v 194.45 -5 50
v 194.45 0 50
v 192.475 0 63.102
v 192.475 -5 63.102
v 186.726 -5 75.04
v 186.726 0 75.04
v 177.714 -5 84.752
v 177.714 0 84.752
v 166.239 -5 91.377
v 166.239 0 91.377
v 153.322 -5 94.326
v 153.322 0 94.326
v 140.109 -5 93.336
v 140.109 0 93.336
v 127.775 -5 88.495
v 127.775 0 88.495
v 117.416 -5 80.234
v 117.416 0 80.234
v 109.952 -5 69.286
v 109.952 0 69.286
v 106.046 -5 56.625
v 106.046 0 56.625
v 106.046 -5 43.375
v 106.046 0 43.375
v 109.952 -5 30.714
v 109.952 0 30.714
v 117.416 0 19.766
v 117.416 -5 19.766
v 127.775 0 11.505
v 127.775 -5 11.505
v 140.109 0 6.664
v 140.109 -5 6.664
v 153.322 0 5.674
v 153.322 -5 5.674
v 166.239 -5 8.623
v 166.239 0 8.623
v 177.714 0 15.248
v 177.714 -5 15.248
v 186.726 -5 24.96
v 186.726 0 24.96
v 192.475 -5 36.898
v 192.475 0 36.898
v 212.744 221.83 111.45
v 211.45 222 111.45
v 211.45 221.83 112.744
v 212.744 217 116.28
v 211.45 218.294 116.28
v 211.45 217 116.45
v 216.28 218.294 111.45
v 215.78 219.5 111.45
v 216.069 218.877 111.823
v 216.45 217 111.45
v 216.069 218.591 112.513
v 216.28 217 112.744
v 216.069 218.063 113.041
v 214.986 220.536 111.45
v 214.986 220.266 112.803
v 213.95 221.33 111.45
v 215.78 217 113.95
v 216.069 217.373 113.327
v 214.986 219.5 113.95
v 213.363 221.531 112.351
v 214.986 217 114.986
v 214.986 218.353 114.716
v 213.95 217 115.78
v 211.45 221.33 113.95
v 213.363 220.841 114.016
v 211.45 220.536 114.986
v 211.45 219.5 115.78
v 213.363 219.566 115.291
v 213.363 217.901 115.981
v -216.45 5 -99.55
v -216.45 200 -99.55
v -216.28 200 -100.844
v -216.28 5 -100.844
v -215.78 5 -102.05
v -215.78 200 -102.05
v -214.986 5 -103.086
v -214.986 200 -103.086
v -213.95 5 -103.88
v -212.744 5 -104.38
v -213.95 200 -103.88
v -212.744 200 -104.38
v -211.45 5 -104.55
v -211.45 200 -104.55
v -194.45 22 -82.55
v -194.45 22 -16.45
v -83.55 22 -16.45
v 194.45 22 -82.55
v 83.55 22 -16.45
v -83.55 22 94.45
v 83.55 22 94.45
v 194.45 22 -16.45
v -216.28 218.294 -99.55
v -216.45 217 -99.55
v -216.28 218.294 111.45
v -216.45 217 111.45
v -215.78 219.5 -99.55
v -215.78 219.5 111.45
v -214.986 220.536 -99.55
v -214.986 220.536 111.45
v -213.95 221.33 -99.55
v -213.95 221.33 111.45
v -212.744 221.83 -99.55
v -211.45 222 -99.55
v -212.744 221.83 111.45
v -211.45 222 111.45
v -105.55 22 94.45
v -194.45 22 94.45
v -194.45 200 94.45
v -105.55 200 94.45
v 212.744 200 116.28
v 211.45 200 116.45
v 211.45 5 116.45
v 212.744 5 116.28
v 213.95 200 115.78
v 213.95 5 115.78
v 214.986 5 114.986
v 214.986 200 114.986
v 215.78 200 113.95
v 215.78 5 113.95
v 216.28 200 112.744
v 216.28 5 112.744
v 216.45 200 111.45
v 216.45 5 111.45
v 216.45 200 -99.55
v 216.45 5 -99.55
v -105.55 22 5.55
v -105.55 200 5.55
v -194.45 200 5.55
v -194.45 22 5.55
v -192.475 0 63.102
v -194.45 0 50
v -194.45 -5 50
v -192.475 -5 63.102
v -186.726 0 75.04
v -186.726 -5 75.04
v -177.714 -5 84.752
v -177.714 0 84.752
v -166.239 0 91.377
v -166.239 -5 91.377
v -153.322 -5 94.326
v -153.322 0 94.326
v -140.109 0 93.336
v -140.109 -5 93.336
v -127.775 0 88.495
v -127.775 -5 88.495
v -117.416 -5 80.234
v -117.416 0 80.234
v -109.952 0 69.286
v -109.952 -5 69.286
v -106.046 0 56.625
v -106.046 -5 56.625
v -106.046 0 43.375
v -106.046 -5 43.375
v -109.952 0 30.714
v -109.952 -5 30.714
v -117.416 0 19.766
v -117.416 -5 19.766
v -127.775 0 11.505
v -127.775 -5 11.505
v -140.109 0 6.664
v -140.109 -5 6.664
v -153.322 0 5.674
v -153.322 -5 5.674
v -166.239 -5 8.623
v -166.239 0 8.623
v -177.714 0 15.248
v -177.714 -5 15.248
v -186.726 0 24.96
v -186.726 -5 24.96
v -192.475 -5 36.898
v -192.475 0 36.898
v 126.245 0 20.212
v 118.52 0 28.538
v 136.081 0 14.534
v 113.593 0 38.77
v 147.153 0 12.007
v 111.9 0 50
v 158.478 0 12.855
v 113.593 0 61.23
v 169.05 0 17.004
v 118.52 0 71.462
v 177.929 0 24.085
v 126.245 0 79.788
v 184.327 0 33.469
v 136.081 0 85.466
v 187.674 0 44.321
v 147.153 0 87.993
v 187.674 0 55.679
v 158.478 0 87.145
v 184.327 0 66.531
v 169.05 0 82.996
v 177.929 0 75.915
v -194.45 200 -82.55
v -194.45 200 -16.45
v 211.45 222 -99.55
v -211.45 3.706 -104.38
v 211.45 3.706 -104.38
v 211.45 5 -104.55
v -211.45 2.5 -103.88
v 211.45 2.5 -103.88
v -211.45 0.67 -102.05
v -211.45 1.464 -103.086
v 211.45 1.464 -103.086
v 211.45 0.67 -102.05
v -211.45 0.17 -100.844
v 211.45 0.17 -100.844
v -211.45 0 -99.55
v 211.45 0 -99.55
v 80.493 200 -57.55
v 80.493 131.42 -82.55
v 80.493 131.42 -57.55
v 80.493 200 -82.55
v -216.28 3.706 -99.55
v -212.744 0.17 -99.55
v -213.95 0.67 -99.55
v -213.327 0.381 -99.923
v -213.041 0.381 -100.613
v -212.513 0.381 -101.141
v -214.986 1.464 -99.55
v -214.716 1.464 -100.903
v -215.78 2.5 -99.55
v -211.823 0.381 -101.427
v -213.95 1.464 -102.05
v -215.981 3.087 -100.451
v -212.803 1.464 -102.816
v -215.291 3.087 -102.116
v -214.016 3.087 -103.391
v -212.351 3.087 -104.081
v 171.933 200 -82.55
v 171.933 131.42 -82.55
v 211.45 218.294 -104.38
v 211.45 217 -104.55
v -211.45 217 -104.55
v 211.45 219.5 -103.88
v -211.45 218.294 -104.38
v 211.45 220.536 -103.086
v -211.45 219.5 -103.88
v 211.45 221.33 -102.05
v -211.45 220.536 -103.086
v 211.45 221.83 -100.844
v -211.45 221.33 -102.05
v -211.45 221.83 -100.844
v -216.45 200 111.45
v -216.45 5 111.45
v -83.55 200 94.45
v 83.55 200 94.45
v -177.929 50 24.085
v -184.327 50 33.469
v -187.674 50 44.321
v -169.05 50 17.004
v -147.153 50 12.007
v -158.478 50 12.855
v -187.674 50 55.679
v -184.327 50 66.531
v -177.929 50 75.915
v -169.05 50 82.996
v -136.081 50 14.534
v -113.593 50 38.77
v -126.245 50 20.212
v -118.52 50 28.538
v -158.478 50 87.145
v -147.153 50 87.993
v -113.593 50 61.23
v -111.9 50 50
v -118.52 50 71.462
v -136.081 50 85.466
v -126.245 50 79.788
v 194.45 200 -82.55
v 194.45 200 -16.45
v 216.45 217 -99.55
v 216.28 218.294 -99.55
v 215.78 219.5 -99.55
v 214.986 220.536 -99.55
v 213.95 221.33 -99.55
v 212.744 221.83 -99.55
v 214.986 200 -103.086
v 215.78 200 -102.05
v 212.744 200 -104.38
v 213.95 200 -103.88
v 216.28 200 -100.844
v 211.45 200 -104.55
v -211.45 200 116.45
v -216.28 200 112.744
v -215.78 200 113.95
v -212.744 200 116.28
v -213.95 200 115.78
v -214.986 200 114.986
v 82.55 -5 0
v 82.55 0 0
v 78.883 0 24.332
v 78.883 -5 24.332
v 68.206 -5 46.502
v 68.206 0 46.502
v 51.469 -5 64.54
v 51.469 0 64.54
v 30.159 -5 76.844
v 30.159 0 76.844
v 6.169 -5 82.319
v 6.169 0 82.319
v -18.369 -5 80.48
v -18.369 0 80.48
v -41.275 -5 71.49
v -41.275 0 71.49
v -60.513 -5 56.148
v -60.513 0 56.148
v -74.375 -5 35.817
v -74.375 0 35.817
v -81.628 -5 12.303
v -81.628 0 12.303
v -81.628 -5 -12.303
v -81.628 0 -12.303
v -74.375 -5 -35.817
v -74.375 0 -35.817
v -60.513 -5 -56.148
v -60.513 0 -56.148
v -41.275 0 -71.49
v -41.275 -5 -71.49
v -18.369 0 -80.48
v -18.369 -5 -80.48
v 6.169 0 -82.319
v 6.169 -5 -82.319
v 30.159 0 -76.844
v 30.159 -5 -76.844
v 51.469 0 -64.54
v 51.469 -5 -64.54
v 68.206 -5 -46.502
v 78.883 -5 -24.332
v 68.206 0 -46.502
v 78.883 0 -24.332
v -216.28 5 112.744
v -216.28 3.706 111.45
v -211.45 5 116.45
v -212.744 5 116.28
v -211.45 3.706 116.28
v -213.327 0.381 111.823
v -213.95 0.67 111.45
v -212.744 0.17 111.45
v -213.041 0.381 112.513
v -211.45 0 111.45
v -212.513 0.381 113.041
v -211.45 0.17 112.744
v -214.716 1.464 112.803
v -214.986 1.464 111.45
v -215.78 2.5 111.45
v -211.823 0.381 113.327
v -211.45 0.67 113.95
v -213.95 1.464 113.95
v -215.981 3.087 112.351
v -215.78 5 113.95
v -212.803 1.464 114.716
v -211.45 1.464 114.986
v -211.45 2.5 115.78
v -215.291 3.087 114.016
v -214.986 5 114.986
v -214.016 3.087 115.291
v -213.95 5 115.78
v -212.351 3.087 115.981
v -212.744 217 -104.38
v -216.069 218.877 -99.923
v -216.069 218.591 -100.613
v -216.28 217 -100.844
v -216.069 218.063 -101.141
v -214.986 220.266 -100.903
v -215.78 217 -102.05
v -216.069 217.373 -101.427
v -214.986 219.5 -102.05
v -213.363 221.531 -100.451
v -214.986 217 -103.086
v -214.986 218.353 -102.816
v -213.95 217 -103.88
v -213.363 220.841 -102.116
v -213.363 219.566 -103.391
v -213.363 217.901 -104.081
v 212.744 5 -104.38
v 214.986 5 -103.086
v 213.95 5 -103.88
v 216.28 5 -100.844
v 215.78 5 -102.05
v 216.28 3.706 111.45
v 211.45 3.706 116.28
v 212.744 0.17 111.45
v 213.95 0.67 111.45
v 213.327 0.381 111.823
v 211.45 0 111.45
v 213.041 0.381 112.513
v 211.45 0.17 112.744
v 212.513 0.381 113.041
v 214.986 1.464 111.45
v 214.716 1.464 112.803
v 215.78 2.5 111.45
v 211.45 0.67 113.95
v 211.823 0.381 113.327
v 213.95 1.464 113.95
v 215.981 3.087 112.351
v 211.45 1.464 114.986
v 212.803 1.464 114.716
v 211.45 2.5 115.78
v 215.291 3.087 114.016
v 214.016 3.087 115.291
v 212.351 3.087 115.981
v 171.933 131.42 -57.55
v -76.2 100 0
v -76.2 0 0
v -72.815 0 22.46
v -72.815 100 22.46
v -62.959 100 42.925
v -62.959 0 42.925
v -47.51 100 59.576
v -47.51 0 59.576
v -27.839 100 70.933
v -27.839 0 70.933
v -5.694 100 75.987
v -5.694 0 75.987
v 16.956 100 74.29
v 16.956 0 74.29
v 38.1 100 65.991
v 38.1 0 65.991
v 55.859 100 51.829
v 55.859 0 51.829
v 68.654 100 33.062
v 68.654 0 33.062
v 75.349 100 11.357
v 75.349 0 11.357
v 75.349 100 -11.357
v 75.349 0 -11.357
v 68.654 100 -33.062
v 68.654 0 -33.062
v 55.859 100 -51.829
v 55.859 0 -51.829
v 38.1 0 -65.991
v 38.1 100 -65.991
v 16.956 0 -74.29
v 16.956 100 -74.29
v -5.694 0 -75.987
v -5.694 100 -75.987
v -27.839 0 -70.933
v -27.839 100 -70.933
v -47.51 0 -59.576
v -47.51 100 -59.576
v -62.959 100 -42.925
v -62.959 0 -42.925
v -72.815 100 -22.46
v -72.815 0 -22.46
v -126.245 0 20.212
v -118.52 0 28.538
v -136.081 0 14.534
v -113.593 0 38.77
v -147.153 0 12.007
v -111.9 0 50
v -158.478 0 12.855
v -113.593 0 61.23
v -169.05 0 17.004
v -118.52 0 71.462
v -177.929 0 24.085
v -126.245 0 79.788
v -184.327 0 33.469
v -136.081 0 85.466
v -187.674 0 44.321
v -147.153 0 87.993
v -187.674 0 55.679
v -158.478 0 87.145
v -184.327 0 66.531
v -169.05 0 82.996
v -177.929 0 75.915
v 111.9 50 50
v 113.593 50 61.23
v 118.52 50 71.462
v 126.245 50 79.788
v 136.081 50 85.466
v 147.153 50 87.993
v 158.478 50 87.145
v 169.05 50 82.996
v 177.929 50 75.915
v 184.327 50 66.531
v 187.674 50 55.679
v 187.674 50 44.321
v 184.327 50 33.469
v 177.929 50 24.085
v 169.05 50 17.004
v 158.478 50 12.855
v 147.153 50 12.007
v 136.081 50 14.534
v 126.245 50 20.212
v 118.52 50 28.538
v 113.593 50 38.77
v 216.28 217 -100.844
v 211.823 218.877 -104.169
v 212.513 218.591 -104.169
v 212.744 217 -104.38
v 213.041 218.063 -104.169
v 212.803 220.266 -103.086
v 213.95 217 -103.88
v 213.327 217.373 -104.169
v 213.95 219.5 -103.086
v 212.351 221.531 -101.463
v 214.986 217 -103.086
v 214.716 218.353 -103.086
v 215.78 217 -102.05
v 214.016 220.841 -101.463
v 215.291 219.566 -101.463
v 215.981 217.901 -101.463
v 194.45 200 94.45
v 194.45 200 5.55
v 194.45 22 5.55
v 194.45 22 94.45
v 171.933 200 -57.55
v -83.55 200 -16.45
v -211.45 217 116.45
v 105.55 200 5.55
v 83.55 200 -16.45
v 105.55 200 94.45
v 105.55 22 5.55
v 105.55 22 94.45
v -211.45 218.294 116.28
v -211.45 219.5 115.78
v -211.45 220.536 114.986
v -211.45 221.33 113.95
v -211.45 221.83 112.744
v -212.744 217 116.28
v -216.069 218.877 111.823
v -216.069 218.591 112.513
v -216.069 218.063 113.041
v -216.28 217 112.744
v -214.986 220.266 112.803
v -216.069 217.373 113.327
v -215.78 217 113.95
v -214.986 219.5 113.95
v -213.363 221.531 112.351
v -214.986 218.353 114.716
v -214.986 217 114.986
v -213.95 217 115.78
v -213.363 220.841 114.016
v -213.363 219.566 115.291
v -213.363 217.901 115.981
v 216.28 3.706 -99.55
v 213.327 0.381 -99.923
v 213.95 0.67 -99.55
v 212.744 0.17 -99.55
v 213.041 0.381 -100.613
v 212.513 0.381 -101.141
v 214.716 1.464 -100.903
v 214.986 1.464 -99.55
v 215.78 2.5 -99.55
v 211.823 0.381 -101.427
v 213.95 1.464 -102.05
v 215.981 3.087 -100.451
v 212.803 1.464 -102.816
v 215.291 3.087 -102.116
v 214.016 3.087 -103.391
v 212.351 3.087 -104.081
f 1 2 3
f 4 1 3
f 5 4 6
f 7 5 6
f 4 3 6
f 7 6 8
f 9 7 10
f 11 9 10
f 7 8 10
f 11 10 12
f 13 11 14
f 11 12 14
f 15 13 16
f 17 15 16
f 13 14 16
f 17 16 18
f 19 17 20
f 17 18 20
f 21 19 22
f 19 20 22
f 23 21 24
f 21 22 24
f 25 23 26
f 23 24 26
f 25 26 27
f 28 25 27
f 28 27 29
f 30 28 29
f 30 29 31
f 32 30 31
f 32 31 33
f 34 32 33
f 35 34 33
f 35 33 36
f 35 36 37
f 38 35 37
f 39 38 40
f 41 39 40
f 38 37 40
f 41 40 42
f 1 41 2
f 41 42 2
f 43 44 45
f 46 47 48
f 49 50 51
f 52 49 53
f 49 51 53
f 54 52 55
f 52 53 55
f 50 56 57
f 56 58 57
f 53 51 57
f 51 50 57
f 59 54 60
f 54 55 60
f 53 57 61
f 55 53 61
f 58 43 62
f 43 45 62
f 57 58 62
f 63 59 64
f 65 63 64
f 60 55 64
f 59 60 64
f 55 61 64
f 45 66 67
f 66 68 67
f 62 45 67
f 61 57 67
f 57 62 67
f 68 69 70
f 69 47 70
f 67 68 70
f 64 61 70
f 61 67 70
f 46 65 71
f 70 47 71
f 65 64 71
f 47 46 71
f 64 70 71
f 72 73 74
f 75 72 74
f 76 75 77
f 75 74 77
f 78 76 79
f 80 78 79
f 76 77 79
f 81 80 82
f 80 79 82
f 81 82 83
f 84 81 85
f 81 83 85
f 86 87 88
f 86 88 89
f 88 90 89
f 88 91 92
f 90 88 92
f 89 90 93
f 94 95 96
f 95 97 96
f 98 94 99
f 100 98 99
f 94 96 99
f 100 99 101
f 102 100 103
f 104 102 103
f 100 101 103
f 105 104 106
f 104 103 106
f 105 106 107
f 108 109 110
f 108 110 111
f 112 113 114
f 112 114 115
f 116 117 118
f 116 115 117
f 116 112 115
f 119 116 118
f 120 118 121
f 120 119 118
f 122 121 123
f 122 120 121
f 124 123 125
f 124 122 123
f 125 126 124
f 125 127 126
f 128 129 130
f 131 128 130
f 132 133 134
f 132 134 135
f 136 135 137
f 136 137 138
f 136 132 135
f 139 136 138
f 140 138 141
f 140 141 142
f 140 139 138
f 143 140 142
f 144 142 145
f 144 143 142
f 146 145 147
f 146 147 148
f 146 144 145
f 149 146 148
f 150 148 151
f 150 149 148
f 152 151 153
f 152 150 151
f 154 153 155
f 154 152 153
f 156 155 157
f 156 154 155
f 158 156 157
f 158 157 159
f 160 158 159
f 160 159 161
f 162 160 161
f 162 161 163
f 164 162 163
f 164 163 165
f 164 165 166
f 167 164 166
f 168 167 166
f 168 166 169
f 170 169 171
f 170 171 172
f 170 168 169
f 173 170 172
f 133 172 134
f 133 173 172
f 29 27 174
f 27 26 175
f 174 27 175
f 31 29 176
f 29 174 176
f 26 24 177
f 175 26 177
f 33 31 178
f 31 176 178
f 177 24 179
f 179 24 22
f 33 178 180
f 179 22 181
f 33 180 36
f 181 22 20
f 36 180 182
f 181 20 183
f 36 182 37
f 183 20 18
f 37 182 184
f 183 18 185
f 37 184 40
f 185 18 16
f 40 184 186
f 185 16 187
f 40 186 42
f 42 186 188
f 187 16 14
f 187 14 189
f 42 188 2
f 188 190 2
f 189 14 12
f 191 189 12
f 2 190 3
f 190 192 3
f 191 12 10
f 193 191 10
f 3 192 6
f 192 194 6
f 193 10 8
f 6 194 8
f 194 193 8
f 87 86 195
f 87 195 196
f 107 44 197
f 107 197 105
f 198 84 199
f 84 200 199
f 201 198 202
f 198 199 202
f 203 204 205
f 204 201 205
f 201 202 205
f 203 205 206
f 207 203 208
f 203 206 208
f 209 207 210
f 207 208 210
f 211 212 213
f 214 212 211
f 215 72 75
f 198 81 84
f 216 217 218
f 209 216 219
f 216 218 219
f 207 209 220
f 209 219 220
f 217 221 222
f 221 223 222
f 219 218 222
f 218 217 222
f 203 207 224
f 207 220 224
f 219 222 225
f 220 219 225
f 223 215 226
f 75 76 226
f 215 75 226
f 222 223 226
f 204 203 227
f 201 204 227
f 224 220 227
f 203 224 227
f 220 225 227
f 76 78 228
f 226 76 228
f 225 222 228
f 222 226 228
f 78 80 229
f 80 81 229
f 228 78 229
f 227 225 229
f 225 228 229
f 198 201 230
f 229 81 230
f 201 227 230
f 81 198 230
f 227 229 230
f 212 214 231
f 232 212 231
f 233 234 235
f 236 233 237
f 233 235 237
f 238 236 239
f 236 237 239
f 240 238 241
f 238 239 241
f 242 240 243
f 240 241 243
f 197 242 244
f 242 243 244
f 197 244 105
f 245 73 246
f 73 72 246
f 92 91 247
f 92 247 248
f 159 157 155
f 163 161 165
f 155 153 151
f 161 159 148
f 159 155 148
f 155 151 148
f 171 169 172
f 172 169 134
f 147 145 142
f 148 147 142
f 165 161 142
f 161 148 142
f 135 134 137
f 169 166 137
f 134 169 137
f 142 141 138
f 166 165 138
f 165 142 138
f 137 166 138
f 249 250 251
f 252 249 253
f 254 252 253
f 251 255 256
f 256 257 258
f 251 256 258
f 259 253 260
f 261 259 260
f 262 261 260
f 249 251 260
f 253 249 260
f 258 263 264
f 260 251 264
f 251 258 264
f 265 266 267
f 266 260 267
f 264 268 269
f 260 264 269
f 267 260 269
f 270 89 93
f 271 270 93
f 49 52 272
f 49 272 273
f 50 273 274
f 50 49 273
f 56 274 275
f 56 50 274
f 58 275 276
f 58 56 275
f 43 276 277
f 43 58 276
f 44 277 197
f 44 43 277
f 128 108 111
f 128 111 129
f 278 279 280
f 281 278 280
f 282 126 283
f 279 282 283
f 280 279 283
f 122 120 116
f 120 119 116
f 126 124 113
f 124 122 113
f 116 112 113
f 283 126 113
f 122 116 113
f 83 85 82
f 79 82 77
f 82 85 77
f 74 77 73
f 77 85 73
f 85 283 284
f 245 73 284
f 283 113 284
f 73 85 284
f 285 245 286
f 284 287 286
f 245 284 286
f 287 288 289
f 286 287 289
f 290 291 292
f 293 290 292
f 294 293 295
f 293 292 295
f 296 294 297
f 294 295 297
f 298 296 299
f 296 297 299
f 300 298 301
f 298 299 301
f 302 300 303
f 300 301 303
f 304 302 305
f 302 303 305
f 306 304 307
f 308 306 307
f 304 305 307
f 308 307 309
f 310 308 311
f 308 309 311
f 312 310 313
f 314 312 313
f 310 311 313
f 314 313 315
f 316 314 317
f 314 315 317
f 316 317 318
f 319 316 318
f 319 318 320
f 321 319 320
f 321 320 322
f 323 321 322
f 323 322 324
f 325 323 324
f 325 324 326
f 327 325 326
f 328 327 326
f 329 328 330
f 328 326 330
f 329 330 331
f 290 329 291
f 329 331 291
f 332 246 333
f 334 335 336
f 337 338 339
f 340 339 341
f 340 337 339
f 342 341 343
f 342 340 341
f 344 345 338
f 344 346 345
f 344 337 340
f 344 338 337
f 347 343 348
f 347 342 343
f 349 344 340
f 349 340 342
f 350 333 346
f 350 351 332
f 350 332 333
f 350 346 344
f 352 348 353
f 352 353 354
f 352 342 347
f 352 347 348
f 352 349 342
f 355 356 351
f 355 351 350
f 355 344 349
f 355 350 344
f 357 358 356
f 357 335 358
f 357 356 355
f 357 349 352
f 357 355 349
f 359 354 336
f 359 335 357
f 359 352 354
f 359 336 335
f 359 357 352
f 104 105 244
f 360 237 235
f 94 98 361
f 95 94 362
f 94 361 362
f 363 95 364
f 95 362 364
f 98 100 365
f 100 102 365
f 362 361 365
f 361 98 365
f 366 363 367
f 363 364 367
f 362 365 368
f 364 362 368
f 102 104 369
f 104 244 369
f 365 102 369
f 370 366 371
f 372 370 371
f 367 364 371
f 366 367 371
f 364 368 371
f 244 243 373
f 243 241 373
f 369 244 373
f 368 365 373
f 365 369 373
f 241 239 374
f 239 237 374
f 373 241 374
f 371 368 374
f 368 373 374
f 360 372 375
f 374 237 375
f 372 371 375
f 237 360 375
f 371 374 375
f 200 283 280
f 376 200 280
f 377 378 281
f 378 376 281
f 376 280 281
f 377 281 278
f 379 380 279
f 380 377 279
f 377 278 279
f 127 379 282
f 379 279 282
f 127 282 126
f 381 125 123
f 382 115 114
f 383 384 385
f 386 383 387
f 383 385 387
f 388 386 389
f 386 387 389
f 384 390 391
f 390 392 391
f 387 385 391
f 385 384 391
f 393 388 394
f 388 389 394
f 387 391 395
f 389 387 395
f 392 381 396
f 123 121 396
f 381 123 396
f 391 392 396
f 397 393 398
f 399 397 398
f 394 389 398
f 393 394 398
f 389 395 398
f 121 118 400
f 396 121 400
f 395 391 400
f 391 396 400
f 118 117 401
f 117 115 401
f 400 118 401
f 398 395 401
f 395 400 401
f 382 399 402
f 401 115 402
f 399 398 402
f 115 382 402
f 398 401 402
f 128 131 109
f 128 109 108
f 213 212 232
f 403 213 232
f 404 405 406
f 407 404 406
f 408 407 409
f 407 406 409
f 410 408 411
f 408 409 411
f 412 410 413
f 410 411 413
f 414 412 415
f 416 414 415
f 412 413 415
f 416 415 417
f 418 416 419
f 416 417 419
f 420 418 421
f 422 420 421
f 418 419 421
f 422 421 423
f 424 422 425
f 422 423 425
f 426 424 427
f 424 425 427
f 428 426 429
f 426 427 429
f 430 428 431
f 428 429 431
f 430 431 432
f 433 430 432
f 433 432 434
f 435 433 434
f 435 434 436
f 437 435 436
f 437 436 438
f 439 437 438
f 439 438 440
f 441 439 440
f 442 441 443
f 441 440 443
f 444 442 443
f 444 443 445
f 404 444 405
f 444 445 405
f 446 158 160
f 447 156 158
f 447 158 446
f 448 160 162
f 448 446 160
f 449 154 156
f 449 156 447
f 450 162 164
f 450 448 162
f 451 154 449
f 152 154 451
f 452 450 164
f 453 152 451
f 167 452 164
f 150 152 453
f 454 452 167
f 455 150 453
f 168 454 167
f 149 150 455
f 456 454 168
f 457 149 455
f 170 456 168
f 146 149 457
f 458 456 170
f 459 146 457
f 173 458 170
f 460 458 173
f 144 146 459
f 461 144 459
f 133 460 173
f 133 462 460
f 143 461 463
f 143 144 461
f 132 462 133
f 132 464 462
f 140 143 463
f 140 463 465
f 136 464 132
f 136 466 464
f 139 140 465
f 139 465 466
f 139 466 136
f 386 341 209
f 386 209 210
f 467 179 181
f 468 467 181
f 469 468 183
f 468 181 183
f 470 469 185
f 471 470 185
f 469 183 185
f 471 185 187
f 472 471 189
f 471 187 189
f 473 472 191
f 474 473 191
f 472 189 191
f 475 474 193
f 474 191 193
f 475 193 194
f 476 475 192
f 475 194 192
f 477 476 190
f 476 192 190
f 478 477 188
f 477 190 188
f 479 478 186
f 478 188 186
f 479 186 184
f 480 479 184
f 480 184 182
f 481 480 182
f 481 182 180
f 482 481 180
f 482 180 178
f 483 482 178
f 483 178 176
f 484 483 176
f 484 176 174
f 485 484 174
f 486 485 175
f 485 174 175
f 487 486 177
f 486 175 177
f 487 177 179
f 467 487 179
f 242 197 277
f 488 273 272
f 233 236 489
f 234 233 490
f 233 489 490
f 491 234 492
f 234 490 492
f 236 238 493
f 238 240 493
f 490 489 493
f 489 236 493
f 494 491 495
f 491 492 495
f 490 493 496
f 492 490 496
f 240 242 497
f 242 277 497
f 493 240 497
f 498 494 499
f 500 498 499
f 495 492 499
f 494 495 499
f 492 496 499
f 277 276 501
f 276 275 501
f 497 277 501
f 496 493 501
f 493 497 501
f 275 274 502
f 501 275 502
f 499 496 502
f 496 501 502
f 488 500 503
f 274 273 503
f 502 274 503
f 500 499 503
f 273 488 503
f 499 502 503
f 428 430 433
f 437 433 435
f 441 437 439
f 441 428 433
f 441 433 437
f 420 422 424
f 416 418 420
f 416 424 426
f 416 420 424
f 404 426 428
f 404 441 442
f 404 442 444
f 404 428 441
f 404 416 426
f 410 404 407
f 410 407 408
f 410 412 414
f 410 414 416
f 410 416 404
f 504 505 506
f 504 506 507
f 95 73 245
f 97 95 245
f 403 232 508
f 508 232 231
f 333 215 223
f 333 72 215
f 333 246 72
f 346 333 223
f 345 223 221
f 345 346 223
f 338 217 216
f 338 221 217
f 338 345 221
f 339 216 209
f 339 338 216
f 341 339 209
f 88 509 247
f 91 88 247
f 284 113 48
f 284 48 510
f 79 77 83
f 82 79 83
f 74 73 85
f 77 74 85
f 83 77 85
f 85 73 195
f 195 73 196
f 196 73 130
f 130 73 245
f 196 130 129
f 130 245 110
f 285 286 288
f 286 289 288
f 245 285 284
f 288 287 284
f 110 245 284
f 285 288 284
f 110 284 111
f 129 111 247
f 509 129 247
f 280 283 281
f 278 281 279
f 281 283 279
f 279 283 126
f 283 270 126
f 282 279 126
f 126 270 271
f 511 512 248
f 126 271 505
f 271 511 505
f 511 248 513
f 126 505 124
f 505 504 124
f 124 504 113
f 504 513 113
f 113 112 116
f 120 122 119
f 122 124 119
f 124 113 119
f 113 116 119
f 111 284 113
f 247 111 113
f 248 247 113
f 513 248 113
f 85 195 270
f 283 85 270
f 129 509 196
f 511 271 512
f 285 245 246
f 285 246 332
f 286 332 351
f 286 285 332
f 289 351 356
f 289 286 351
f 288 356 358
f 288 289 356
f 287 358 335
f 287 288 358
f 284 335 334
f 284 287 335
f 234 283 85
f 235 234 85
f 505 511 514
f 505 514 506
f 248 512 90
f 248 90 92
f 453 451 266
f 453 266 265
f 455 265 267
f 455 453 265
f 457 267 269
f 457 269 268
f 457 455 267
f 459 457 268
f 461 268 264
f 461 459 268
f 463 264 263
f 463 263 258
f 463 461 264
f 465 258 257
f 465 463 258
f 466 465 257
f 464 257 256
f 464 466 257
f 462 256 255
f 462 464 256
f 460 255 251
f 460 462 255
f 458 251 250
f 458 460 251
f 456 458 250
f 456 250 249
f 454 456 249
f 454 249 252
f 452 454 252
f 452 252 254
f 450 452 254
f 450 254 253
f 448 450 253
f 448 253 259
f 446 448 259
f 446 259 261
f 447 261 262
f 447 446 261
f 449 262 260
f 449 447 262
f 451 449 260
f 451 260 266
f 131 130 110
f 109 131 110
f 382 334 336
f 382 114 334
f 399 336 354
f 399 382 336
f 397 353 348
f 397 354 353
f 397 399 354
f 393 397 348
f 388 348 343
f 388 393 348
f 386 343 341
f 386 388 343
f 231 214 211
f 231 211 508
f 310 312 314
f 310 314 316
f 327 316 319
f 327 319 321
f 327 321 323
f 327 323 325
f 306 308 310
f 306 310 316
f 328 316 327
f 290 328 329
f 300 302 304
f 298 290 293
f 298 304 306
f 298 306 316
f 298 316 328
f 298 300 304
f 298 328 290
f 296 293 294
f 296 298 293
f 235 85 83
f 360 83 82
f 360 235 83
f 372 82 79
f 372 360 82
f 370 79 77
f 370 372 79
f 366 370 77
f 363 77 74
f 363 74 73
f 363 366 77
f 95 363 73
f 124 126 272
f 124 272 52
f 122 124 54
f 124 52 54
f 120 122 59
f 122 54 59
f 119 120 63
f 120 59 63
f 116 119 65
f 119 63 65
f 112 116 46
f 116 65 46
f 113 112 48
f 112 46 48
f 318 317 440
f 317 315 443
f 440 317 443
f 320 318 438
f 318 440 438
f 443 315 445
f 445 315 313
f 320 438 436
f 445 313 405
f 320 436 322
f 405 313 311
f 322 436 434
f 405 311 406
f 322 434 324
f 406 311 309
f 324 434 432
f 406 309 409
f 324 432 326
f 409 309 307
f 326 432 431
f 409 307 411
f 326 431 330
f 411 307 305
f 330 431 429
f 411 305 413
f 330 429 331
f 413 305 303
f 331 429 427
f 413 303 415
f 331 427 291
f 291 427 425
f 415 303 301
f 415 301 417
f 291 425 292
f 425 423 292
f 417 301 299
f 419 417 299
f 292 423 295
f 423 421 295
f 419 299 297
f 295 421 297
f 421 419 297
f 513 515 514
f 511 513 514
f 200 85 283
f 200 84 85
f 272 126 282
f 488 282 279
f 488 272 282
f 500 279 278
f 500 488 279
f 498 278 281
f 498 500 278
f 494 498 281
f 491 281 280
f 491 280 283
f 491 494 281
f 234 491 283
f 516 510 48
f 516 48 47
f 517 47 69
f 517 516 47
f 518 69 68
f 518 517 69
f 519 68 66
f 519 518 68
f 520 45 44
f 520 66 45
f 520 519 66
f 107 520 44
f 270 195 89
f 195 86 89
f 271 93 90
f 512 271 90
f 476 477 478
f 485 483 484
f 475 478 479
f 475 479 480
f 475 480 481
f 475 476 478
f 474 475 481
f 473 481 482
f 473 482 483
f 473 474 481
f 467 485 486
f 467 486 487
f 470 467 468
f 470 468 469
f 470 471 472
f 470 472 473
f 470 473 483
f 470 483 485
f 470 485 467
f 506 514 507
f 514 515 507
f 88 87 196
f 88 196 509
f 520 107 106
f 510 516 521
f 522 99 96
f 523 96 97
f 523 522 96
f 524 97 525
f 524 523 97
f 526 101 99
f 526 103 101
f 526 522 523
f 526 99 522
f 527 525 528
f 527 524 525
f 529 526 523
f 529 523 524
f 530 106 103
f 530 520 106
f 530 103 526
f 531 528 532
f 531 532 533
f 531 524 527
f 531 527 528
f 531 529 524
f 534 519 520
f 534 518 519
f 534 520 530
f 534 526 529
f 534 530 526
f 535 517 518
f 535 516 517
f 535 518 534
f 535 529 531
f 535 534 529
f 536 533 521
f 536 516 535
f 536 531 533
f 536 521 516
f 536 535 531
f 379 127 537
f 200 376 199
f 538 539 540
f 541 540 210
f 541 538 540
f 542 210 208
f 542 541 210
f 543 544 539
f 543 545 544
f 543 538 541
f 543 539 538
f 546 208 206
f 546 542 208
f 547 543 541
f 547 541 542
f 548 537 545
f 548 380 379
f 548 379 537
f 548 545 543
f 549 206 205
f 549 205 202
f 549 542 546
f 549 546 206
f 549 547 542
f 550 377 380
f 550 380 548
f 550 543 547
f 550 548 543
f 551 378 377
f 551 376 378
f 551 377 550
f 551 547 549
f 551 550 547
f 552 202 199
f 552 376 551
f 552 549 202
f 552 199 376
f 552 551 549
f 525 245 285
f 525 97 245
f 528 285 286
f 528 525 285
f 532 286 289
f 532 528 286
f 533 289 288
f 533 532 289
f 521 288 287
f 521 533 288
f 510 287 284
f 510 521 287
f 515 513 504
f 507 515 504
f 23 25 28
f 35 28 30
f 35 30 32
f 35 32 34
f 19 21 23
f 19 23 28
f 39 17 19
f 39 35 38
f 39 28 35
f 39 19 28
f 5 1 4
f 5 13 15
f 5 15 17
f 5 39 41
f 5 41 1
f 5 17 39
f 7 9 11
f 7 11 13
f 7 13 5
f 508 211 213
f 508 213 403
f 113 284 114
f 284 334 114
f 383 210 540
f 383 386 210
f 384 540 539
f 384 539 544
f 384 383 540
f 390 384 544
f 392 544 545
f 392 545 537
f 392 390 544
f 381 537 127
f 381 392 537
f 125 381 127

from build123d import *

# Parameters (mm, degrees)
F3_R      = 82.55
F4_DEPTH  = 5
F5_R      = 76.2
F6_DEPTH  = 100
F7_R      = 44.45
F8_DEPTH  = 5
F9_R      = 38.1
F10_DEPTH = 50
F12_W     = 432.9
F12_H     = 221
F13_DEPTH = 200
F14_T     = -22
F16_DEPTH = 178
F18_W     = 91.44
F18_H     = 68.58
F19_DEPTH = 25
F20_W     = 432.9
F20_H     = 221
F21_DEPTH = 22
F22_R     = 5
F22_2_R   = 5


with BuildPart() as f4:
    # F3 (on Front) → F4 (new body)
    with BuildSketch(Plane.XZ):
        Circle(F3_R)
    extrude(amount=F4_DEPTH)

    # F5 (on face) → F6 (join)
    with BuildSketch(Plane(origin=(0, 0, 0), x_dir=(-1, 0, 0), z_dir=(0, 1, 0))):
        Circle(F5_R)
    extrude(amount=F6_DEPTH)


with BuildPart() as f8:
    # F7 (on Front) → F8 (new body)
    with BuildSketch(Plane.XZ):
        with Locations((150, 50)):
            Circle(F7_R)
    extrude(amount=F8_DEPTH)

    # F9 (on face) → F10 (join)
    with BuildSketch(Plane(origin=(0, 0, 0), x_dir=(-1, 0, 0), z_dir=(0, 1, 0))):
        with Locations((-150, 50)):
            Circle(F9_R)
    extrude(amount=F10_DEPTH)


with BuildPart() as f11_1:
    # F11: instance of F8
    add(f8.part.mirror(Plane.YZ))


with BuildPart() as f13:
    # F12 (on Front) → F13 (new body)
    with BuildSketch(Plane.XZ):
        with Locations((0, 5.95)):
            Rectangle(F12_W, F12_H)
    extrude(amount=-F13_DEPTH)

    # F14
    f14_openings = [f13.faces().sort_by_distance(p)[0] for p in [
        (0, 200, 5.95),
    ]]
    offset(amount=F14_T, openings=f14_openings)



with BuildPart() as f16:
    # F15 (on face) → F16 (new body, through all)
    with BuildSketch(Plane(origin=(0, 22, 0), x_dir=(-1, 0, 0), z_dir=(0, 1, 0))):
        Polygon((-83.55, 94.45), (-105.55, 94.45), (-105.55, 5.55), (-194.45, 5.55), (-194.45, -16.45), (-83.55, -16.45), align=None)
    extrude(amount=F16_DEPTH)


with BuildPart() as f13_1:
    add(f13.part)

    add(f16.part)  # F17 merges F16
    # F17: F16 across plane
    add(f16.part.mirror(Plane.YZ))

    # F22#2
    f22_2_edges = [f13_1.edges().sort_by_distance(p)[0] for p in [
        (216.45, 100, 116.45),
        (216.45, 100, -104.55),
        (216.45, 0, 5.95),
        (-216.45, 100, 116.45),
        (-216.45, 100, -104.55),
        (-216.45, 0, 5.95),
        (0, 0, 116.45),
        (0, 0, -104.55),
    ]]
    fillet(f22_2_edges, radius=F22_2_R)


with BuildPart() as f19:
    # F18 (on face) → F19 (new body)
    with BuildSketch(Plane.XY.offset(-82.55)):
        with Locations((126.2130402029, 165.71)):
            Rectangle(F18_W, F18_H)
    extrude(amount=F19_DEPTH)


with BuildPart() as f21:
    # F20 (on face) → F21 (new body)
    with BuildSketch(Plane(origin=(0, 200, 0), x_dir=(-1, 0, 0), z_dir=(0, 1, 0))):
        with Locations((0, 5.95)):
            Rectangle(F20_W, F20_H)
    extrude(amount=F21_DEPTH)

    # F22
    f22_edges = [f21.edges().sort_by_distance(p)[0] for p in [
        (0, 222, 116.45),
        (216.45, 222, 5.95),
        (0, 222, -104.55),
        (-216.45, 222, 5.95),
        (216.45, 211, 116.45),
        (216.45, 211, -104.55),
        (-216.45, 211, 116.45),
        (-216.45, 211, -104.55),
    ]]
    fillet(f22_edges, radius=F22_R)


solid = Compound([f4.part, f8.part, f11_1.part, f13_1.part, f19.part, f21.part])
